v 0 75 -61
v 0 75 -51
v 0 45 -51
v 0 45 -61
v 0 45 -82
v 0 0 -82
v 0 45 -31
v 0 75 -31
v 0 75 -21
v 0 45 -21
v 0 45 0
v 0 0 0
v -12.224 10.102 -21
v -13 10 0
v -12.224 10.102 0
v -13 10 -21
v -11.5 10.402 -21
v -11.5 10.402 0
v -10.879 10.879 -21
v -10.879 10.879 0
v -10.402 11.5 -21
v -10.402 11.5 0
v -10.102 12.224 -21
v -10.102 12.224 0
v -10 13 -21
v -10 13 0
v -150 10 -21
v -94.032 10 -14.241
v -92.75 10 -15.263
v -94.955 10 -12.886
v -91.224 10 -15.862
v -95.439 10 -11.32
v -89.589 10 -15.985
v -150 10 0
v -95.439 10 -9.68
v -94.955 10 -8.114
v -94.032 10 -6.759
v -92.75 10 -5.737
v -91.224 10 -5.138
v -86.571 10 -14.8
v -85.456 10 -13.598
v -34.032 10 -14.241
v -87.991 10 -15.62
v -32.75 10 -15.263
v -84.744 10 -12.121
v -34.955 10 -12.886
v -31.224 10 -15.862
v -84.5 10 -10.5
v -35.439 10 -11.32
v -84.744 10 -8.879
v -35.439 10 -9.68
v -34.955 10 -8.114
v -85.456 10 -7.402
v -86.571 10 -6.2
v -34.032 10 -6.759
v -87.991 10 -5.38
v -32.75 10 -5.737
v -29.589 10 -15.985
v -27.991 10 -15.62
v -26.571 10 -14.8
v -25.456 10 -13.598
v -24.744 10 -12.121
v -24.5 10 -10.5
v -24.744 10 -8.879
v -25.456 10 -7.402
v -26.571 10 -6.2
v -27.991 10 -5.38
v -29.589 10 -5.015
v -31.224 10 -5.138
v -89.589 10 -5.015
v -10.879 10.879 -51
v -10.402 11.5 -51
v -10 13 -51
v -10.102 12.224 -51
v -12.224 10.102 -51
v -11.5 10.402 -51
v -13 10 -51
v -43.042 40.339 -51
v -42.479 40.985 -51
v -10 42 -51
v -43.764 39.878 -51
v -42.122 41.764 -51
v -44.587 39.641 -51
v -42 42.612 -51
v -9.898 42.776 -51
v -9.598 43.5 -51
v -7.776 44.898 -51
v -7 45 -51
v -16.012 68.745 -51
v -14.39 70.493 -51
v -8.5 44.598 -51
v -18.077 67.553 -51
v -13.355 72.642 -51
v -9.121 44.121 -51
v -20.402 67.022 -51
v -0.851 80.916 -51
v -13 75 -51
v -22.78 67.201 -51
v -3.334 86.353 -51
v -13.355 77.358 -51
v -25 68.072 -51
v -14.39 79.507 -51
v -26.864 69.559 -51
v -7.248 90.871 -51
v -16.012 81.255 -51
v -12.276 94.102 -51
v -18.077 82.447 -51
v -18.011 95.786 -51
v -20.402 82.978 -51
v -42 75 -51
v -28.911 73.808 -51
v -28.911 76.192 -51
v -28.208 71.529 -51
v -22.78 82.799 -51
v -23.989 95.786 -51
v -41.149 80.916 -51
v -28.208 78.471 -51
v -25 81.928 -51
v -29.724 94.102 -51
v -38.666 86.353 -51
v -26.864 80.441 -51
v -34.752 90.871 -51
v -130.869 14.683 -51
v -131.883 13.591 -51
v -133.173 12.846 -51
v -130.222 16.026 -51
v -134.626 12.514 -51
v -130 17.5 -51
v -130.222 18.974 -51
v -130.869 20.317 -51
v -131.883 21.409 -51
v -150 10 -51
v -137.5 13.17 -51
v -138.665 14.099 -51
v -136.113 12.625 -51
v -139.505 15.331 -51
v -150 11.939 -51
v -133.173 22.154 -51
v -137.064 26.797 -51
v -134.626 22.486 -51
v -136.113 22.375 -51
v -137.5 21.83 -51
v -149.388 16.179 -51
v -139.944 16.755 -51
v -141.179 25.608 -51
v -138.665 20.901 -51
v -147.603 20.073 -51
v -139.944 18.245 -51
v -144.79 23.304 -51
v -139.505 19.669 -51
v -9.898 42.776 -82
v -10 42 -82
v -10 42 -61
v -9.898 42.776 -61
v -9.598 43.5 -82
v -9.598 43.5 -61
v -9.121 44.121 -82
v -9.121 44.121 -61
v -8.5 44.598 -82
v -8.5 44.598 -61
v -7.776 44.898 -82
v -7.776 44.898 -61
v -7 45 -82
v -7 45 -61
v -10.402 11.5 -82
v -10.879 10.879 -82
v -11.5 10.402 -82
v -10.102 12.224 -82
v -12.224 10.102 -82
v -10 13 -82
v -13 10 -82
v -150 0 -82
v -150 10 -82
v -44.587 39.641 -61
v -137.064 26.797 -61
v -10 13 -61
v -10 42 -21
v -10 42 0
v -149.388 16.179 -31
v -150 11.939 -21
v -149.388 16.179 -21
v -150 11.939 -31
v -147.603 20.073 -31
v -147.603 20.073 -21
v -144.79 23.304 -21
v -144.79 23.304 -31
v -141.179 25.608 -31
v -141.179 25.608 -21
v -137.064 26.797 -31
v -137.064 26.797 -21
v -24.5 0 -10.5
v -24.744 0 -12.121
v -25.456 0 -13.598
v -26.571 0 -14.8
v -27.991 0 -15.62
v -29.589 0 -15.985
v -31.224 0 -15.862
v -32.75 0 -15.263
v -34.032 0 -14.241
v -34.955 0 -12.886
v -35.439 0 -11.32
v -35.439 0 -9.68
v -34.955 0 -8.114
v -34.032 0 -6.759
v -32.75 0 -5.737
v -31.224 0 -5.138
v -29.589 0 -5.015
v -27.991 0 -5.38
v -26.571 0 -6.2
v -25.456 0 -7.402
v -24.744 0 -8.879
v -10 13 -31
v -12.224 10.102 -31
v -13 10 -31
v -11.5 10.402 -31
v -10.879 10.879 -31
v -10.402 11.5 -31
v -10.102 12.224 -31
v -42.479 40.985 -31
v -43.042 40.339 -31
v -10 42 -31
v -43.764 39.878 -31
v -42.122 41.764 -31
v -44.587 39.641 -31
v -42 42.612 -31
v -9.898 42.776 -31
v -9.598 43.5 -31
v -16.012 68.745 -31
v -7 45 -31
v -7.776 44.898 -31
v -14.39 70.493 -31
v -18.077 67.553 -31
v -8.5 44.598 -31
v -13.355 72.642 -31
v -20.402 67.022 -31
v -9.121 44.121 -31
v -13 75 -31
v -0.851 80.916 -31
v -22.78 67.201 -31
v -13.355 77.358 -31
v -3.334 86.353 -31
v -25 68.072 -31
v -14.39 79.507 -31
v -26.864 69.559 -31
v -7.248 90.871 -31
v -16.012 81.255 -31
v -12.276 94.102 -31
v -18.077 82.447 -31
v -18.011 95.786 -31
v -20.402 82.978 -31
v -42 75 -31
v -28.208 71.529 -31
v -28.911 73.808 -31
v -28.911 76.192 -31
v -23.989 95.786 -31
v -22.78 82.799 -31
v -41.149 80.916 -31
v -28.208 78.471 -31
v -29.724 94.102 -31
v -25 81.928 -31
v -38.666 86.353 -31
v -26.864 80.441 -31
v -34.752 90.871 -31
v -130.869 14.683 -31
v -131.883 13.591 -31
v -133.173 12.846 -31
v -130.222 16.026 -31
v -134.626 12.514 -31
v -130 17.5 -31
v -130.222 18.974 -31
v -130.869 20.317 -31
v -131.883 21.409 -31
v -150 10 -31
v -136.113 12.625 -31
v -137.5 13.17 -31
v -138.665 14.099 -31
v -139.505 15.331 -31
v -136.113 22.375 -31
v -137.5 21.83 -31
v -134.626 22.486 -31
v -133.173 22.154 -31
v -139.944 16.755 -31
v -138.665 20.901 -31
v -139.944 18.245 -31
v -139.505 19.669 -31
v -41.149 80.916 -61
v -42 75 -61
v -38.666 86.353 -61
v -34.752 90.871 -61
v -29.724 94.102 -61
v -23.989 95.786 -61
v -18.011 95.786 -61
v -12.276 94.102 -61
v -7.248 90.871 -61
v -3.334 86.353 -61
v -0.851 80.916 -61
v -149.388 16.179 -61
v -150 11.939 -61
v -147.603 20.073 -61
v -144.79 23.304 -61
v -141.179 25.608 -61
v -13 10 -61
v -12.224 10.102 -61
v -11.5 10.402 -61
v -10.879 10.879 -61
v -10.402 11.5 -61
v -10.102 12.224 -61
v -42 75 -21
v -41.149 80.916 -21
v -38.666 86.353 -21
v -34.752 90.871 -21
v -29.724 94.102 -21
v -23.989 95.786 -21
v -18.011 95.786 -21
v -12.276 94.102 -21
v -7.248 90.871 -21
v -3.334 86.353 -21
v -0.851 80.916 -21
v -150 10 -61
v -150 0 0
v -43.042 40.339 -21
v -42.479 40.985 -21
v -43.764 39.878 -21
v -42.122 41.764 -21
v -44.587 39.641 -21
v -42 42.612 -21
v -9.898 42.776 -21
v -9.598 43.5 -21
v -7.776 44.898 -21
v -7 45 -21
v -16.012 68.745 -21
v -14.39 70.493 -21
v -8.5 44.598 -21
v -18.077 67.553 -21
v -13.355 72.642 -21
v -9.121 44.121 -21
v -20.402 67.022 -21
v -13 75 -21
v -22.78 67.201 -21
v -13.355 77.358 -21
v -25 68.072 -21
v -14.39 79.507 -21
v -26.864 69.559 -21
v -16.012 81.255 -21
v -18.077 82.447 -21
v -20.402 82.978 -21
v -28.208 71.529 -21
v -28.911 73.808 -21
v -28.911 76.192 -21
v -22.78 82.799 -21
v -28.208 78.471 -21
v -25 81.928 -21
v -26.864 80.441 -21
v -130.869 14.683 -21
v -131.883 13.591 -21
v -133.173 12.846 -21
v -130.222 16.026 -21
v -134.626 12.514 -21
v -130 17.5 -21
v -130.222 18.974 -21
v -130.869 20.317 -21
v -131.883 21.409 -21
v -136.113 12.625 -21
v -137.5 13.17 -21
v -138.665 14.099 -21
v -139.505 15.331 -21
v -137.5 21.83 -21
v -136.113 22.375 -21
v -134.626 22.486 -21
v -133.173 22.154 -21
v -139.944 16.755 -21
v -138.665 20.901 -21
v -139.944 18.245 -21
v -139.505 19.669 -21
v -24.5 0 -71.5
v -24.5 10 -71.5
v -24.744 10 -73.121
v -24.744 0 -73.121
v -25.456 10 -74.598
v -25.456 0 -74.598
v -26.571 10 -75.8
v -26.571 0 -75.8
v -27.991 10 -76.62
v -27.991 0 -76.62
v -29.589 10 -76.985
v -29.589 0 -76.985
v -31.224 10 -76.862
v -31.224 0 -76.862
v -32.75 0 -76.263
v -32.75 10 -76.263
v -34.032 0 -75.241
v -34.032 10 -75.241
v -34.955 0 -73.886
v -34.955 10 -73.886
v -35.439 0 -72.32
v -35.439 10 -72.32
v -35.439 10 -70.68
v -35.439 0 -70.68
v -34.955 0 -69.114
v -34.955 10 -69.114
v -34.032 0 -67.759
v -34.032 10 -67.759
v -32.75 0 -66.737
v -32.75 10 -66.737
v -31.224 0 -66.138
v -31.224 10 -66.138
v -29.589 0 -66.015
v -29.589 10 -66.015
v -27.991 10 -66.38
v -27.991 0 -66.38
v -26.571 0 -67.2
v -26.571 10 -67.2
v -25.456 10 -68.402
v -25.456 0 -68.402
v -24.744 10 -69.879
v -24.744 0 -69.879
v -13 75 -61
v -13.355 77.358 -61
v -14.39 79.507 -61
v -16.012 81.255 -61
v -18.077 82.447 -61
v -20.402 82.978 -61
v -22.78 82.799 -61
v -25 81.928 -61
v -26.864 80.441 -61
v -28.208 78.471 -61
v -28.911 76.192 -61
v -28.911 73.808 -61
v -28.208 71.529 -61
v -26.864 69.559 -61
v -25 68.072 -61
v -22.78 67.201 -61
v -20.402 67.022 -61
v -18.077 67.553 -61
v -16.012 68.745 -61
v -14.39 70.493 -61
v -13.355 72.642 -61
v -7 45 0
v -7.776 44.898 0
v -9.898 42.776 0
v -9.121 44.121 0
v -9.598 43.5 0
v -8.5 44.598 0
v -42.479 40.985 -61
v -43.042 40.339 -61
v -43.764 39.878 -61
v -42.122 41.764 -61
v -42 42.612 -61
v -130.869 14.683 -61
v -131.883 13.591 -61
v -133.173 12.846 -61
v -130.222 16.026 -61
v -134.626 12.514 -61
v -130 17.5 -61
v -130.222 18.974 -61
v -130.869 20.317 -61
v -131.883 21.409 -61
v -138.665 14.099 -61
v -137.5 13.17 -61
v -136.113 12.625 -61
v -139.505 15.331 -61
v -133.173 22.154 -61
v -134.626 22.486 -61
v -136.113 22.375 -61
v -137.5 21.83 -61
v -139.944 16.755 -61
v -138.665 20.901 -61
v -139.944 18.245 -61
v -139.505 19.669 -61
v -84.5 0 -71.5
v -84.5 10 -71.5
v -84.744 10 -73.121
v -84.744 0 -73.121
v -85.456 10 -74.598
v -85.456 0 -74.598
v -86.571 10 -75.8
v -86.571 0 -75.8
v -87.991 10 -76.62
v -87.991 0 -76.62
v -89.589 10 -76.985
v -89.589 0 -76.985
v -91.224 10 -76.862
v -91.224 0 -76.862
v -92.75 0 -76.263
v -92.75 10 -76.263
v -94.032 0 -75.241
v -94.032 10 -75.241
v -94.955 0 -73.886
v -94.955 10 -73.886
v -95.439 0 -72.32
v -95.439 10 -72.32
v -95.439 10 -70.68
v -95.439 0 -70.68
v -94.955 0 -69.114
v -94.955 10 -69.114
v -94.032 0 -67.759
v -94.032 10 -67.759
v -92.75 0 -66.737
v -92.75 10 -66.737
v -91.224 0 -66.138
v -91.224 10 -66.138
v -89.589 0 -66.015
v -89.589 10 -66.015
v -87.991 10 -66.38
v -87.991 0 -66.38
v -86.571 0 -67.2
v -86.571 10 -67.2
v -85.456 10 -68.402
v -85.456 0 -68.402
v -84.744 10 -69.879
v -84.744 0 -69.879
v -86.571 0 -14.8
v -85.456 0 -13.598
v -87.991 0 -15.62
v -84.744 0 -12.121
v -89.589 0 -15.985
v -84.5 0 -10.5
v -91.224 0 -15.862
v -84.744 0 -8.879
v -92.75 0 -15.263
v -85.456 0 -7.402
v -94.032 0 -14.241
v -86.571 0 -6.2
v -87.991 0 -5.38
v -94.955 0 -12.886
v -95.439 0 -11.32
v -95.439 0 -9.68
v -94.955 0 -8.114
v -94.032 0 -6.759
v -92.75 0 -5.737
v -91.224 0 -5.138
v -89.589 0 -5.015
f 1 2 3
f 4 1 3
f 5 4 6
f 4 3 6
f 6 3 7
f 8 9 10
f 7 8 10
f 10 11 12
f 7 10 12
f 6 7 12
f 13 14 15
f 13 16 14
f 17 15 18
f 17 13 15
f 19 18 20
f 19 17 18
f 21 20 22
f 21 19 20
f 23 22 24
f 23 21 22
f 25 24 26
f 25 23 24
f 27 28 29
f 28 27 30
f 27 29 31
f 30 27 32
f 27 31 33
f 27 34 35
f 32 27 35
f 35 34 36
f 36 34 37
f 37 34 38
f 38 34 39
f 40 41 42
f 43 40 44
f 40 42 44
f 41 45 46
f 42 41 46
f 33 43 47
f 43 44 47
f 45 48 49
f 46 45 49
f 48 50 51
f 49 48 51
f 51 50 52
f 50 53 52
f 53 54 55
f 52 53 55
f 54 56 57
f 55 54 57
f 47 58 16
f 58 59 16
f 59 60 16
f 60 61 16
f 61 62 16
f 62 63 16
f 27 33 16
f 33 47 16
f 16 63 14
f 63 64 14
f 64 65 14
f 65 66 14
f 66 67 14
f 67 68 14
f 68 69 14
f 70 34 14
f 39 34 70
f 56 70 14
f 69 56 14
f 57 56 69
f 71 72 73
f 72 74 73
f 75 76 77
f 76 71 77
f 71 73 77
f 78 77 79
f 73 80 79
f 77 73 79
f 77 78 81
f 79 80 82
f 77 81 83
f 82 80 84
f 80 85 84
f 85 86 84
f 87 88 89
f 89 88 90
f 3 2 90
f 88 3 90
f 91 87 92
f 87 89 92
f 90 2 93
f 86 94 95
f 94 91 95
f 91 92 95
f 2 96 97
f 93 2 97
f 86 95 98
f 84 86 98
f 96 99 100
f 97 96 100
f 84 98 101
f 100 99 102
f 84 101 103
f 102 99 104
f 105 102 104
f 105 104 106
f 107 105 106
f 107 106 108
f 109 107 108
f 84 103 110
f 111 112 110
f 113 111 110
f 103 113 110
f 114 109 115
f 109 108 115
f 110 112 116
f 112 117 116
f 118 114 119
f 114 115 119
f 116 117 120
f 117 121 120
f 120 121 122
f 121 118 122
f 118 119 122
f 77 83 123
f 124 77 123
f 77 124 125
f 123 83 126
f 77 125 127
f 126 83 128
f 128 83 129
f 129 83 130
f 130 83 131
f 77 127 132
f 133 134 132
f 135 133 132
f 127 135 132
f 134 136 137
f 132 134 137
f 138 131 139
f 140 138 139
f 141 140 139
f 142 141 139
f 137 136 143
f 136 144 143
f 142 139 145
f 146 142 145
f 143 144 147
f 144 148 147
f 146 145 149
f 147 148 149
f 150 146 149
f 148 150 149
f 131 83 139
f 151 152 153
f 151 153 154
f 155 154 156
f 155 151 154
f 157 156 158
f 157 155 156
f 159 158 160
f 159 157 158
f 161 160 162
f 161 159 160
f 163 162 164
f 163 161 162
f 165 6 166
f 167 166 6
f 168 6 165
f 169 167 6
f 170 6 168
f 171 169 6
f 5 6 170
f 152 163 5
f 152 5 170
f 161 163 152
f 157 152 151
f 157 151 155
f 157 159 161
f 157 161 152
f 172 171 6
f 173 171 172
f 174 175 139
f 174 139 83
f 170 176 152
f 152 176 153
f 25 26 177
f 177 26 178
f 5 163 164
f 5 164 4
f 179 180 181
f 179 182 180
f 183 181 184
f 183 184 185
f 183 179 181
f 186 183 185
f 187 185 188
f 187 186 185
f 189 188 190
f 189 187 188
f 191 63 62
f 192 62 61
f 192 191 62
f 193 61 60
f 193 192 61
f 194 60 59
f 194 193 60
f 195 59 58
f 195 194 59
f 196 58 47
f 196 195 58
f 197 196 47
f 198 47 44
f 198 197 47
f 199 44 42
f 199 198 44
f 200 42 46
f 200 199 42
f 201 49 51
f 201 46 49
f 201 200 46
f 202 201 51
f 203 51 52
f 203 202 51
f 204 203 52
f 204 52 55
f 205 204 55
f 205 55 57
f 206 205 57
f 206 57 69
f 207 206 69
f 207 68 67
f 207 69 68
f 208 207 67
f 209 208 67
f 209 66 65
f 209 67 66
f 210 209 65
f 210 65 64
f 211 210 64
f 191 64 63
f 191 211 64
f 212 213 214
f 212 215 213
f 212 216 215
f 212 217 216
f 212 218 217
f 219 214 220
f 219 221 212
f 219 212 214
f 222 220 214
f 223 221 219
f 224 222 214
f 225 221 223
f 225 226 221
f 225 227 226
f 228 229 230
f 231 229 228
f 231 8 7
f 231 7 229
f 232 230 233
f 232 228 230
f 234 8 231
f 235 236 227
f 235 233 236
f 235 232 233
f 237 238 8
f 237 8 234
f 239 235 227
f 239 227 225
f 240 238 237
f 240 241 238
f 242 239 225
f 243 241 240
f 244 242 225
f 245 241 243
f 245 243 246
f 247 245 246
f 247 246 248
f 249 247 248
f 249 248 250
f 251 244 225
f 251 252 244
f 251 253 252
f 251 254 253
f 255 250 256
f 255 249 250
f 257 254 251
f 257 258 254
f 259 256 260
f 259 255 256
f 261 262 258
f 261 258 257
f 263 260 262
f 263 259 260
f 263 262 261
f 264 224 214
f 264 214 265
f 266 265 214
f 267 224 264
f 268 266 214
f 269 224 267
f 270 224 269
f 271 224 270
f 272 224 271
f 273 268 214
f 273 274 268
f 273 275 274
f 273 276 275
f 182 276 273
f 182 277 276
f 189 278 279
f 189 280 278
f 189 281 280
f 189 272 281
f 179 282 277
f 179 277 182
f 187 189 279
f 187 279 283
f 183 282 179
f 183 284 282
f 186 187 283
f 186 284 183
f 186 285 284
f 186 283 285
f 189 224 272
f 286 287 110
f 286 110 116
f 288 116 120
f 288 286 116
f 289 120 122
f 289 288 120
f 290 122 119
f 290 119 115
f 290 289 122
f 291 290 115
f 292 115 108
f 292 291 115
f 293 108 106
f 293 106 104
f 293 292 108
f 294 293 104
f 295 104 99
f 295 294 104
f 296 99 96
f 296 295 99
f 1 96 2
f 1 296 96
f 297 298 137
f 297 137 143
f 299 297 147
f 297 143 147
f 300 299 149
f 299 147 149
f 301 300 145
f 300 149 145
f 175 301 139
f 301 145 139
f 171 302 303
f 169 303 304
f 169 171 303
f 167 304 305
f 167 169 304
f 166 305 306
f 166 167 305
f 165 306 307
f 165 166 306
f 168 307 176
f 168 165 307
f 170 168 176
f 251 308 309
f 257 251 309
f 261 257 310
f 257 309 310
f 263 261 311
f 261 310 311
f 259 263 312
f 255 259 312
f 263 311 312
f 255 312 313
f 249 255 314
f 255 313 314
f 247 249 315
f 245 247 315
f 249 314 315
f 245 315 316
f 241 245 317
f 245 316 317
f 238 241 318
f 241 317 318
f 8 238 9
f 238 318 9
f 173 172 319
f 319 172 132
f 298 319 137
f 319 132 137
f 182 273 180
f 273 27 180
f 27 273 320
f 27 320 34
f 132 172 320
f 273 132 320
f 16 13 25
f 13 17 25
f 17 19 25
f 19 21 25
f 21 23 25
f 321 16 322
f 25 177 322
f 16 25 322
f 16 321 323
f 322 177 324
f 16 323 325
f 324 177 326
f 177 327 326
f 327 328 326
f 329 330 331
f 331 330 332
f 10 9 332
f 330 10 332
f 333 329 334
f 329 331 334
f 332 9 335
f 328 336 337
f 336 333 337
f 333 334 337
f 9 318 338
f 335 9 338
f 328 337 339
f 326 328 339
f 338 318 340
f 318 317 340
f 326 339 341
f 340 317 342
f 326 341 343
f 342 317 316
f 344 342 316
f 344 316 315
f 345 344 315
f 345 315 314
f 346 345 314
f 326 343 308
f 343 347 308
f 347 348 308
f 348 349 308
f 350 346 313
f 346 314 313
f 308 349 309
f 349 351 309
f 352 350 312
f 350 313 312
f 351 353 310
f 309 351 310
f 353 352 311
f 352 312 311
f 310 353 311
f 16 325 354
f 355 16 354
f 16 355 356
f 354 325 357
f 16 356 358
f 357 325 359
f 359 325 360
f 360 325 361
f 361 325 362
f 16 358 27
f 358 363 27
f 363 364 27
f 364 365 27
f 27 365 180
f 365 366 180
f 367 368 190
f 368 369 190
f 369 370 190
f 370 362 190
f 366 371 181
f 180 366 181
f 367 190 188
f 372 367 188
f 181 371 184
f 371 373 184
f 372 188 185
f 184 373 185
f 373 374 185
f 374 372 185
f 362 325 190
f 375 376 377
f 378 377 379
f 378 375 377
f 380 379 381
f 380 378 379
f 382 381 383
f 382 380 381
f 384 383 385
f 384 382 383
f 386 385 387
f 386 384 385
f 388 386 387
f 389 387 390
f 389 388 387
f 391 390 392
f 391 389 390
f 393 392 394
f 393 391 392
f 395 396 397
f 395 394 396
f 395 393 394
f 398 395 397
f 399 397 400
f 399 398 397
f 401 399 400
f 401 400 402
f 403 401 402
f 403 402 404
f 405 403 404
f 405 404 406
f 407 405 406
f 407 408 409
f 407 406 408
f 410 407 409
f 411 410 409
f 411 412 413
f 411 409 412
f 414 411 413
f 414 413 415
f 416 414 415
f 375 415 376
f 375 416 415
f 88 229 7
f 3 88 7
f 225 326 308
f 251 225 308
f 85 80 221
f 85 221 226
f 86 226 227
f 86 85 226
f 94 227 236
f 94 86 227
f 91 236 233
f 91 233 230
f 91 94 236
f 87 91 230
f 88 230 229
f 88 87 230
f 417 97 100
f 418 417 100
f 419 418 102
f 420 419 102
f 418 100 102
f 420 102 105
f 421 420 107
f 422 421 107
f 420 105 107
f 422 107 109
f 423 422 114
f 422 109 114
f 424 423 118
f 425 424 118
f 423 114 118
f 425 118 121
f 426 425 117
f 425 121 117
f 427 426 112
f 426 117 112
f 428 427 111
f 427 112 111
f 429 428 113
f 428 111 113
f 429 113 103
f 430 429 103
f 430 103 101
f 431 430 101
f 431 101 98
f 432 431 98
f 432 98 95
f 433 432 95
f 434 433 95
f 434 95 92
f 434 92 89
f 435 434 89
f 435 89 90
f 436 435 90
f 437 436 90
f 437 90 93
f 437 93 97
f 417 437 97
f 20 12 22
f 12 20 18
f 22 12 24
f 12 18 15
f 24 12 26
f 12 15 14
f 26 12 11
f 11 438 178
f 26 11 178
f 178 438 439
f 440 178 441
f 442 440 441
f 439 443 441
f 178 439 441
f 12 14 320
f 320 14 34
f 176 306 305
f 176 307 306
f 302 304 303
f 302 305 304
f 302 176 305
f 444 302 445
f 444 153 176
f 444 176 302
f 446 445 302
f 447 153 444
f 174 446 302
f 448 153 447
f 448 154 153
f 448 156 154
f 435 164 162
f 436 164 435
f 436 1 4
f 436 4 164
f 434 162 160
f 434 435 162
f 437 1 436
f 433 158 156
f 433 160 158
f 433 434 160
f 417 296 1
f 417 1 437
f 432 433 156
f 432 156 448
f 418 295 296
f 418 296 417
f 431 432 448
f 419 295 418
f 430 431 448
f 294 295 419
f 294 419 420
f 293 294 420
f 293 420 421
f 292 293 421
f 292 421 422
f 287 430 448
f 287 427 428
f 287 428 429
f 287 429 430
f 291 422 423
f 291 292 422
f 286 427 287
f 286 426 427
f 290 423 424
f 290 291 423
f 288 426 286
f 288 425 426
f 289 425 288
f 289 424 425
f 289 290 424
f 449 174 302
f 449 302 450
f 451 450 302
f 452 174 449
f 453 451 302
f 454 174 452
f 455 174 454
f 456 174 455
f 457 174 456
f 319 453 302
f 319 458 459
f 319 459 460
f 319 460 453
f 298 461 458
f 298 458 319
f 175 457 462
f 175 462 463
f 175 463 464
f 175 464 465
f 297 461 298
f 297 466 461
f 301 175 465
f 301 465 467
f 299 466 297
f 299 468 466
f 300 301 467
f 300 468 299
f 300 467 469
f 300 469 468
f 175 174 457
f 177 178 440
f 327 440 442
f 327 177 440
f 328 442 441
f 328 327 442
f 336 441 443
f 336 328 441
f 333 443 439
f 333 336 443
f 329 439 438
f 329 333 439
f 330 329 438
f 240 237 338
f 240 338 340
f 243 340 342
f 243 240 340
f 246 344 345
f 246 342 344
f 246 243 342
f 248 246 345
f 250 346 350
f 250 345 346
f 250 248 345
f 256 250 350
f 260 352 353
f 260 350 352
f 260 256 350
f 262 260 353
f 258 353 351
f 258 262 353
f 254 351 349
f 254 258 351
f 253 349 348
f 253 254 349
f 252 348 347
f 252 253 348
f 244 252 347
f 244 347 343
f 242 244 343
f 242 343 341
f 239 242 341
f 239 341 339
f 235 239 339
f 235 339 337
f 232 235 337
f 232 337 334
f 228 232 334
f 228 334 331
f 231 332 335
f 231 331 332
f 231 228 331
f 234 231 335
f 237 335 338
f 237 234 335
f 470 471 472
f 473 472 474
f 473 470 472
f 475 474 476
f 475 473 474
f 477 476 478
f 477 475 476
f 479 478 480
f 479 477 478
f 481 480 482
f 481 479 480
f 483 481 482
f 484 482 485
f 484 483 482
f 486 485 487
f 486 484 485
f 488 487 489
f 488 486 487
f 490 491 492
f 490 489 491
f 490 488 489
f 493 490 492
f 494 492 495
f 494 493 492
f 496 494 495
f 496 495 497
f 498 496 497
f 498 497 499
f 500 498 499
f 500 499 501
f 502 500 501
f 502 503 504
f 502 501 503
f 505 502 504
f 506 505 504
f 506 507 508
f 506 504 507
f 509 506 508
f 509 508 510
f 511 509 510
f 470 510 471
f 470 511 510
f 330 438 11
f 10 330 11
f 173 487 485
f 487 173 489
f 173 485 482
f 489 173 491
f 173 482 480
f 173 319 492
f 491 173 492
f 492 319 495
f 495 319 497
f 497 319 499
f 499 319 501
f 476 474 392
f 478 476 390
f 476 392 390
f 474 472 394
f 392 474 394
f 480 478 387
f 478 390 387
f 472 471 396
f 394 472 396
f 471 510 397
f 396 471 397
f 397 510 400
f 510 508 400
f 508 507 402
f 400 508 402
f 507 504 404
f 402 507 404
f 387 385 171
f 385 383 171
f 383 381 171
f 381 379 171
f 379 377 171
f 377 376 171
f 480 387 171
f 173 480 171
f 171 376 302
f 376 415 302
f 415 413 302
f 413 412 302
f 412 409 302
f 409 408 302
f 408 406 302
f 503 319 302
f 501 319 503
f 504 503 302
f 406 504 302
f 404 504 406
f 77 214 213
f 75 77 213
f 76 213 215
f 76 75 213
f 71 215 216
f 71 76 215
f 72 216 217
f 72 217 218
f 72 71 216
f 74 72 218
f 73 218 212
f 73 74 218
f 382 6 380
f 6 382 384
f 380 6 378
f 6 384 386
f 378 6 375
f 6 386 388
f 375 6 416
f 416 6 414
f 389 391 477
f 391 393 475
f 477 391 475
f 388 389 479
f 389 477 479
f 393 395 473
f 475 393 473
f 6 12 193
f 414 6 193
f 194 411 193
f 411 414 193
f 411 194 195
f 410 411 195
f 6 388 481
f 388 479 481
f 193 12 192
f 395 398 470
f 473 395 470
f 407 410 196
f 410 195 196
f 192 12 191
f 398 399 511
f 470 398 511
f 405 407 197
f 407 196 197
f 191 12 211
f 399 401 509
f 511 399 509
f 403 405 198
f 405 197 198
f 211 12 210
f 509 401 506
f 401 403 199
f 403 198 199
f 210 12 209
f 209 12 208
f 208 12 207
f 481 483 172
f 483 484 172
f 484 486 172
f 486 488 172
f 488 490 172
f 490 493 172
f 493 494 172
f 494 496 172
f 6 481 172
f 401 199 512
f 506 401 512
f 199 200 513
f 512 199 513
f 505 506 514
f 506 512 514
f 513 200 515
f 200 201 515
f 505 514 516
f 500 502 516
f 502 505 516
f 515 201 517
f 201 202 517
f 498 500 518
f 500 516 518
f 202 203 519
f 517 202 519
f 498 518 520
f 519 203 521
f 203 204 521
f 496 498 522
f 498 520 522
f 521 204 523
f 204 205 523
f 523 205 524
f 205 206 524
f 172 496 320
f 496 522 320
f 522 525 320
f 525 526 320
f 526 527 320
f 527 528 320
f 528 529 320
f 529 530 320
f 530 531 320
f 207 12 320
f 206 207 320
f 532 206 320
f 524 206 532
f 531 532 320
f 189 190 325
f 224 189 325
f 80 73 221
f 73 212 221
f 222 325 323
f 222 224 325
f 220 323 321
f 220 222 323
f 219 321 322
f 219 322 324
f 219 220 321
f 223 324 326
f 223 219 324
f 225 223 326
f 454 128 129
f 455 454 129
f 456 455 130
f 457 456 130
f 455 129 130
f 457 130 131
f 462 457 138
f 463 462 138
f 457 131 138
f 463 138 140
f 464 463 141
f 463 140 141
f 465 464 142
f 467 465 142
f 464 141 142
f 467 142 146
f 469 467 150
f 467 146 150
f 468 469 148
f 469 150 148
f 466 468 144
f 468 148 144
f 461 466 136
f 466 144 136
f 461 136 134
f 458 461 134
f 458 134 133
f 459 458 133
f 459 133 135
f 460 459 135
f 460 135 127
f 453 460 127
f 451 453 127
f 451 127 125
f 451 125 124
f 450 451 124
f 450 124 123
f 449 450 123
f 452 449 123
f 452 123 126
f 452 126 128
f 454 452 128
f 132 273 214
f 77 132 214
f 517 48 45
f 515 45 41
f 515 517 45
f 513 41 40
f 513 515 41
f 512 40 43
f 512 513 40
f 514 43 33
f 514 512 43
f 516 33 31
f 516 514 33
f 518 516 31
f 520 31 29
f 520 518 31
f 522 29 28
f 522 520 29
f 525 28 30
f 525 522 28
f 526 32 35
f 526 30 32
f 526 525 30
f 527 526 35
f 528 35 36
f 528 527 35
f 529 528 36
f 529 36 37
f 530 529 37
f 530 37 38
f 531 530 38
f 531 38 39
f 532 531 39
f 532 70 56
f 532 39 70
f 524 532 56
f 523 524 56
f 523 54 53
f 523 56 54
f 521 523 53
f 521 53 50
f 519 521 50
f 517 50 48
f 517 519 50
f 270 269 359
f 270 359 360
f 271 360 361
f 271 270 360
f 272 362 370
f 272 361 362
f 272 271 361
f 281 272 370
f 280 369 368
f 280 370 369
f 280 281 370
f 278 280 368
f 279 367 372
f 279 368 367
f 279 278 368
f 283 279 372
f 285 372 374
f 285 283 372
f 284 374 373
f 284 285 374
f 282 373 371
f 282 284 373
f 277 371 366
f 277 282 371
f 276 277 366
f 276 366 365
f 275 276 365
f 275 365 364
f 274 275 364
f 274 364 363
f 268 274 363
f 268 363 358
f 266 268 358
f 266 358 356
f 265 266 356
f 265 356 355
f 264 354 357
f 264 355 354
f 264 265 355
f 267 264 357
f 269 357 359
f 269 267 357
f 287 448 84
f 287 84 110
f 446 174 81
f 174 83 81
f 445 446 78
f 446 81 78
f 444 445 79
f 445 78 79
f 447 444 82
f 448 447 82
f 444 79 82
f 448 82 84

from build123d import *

# Parameters (mm, degrees)
EXTRUDE_1_DEPTH          = 82
FILLET_1_R               = 3
EXTRUDE_2_DEPTH          = 10
SKETCH_3_R               = 8
SKETCH_3_R_2             = 5
CUT_EXTRUDE_1_DEPTH      = 42
CUT_EXTRUDE_1_DEPTH_BACK = 42
FILLET_2_R               = 15
SKETCH_4_R               = 5.5
CUT_EXTRUDE_2_DEPTH      = 97
CUT_EXTRUDE_2_DEPTH_BACK = 1
FILLET_3_R               = 3
FILLET_4_R               = 3


with BuildPart() as part:
    # 스케치1 → 보스-돌출1 (new body)
    with BuildSketch(Plane.XY):
        Polygon((0, 0), (-150, 0), (-150, 10), (-10, 10), (-10, 45), (0, 45), align=None)
    extrude(amount=-EXTRUDE_1_DEPTH)

    # 필렛1
    fillet_1_edges = [part.edges().sort_by_distance(p)[0] for p in [
        (-10, 45, -41),
    ]]
    fillet(fillet_1_edges, radius=FILLET_1_R)

    # 스케치2 → 보스-돌출2 (add)
    with BuildSketch(Plane(origin=(0, 0, -61), x_dir=(-1, 0, 0), z_dir=(0, 0, -1))):
        with BuildLine():
            Line((150, 0), (150, 25))
            Line((150, 25), (42, 40))
            Line((42, 40), (42, 75))
            ThreePointArc((42, 75), (21, 96), (0, 75))
            Line((0, 75), (0, 0))
            Line((0, 0), (150, 0))
        make_face()
    extrude_2 = extrude(amount=-EXTRUDE_2_DEPTH)

    # 대칭 복사1: 보스-돌출2 across plane
    add(extrude_2.mirror(Plane.XY.offset(-41)))

    # 스케치3 → 컷-돌출1 (cut, two sides)
    with BuildSketch(Plane.XY.offset(-41)) as cut_extrude_1_sk:
        with Locations((-21, 75)):
            Circle(SKETCH_3_R)
        with Locations((-135, 17.5)):
            Circle(SKETCH_3_R_2)
    extrude(amount=CUT_EXTRUDE_1_DEPTH, mode=Mode.SUBTRACT)
    extrude(cut_extrude_1_sk.sketch, amount=-CUT_EXTRUDE_1_DEPTH_BACK, mode=Mode.SUBTRACT)

    # 필렛2
    fillet_2_edges = [part.edges().sort_by_distance(p)[0] for p in [
        (-150, 25, -56),
        (-150, 25, -26),
    ]]
    fillet(fillet_2_edges, radius=FILLET_2_R)

    # 스케치4 → 컷-돌출2 (cut, two sides)
    with BuildSketch(Plane(origin=(0, 0, 0), x_dir=(1, 0, 0), z_dir=(0, 1, 0))) as cut_extrude_2_sk:
        with Locations((-30, 71.5)):
            Circle(SKETCH_4_R)
        with Locations((-90, 71.5)):
            Circle(SKETCH_4_R)
        with Locations((-30, 10.5)):
            Circle(SKETCH_4_R)
        with Locations((-90, 10.5)):
            Circle(SKETCH_4_R)
    extrude(amount=CUT_EXTRUDE_2_DEPTH, mode=Mode.SUBTRACT)
    extrude(cut_extrude_2_sk.sketch, amount=-CUT_EXTRUDE_2_DEPTH_BACK, mode=Mode.SUBTRACT)

    # 필렛3
    fillet_3_edges = [part.edges().sort_by_distance(p)[0] for p in [
        (-10, 10, -71.5),
        (-10, 10, -41),
        (-10, 10, -10.5),
    ]]
    fillet(fillet_3_edges, radius=FILLET_3_R)

    # 필렛4
    fillet_4_edges = [part.edges().sort_by_distance(p)[0] for p in [
        (-42, 40, -56),
        (-42, 40, -26),
    ]]
    fillet(fillet_4_edges, radius=FILLET_4_R)


solid = part.part
